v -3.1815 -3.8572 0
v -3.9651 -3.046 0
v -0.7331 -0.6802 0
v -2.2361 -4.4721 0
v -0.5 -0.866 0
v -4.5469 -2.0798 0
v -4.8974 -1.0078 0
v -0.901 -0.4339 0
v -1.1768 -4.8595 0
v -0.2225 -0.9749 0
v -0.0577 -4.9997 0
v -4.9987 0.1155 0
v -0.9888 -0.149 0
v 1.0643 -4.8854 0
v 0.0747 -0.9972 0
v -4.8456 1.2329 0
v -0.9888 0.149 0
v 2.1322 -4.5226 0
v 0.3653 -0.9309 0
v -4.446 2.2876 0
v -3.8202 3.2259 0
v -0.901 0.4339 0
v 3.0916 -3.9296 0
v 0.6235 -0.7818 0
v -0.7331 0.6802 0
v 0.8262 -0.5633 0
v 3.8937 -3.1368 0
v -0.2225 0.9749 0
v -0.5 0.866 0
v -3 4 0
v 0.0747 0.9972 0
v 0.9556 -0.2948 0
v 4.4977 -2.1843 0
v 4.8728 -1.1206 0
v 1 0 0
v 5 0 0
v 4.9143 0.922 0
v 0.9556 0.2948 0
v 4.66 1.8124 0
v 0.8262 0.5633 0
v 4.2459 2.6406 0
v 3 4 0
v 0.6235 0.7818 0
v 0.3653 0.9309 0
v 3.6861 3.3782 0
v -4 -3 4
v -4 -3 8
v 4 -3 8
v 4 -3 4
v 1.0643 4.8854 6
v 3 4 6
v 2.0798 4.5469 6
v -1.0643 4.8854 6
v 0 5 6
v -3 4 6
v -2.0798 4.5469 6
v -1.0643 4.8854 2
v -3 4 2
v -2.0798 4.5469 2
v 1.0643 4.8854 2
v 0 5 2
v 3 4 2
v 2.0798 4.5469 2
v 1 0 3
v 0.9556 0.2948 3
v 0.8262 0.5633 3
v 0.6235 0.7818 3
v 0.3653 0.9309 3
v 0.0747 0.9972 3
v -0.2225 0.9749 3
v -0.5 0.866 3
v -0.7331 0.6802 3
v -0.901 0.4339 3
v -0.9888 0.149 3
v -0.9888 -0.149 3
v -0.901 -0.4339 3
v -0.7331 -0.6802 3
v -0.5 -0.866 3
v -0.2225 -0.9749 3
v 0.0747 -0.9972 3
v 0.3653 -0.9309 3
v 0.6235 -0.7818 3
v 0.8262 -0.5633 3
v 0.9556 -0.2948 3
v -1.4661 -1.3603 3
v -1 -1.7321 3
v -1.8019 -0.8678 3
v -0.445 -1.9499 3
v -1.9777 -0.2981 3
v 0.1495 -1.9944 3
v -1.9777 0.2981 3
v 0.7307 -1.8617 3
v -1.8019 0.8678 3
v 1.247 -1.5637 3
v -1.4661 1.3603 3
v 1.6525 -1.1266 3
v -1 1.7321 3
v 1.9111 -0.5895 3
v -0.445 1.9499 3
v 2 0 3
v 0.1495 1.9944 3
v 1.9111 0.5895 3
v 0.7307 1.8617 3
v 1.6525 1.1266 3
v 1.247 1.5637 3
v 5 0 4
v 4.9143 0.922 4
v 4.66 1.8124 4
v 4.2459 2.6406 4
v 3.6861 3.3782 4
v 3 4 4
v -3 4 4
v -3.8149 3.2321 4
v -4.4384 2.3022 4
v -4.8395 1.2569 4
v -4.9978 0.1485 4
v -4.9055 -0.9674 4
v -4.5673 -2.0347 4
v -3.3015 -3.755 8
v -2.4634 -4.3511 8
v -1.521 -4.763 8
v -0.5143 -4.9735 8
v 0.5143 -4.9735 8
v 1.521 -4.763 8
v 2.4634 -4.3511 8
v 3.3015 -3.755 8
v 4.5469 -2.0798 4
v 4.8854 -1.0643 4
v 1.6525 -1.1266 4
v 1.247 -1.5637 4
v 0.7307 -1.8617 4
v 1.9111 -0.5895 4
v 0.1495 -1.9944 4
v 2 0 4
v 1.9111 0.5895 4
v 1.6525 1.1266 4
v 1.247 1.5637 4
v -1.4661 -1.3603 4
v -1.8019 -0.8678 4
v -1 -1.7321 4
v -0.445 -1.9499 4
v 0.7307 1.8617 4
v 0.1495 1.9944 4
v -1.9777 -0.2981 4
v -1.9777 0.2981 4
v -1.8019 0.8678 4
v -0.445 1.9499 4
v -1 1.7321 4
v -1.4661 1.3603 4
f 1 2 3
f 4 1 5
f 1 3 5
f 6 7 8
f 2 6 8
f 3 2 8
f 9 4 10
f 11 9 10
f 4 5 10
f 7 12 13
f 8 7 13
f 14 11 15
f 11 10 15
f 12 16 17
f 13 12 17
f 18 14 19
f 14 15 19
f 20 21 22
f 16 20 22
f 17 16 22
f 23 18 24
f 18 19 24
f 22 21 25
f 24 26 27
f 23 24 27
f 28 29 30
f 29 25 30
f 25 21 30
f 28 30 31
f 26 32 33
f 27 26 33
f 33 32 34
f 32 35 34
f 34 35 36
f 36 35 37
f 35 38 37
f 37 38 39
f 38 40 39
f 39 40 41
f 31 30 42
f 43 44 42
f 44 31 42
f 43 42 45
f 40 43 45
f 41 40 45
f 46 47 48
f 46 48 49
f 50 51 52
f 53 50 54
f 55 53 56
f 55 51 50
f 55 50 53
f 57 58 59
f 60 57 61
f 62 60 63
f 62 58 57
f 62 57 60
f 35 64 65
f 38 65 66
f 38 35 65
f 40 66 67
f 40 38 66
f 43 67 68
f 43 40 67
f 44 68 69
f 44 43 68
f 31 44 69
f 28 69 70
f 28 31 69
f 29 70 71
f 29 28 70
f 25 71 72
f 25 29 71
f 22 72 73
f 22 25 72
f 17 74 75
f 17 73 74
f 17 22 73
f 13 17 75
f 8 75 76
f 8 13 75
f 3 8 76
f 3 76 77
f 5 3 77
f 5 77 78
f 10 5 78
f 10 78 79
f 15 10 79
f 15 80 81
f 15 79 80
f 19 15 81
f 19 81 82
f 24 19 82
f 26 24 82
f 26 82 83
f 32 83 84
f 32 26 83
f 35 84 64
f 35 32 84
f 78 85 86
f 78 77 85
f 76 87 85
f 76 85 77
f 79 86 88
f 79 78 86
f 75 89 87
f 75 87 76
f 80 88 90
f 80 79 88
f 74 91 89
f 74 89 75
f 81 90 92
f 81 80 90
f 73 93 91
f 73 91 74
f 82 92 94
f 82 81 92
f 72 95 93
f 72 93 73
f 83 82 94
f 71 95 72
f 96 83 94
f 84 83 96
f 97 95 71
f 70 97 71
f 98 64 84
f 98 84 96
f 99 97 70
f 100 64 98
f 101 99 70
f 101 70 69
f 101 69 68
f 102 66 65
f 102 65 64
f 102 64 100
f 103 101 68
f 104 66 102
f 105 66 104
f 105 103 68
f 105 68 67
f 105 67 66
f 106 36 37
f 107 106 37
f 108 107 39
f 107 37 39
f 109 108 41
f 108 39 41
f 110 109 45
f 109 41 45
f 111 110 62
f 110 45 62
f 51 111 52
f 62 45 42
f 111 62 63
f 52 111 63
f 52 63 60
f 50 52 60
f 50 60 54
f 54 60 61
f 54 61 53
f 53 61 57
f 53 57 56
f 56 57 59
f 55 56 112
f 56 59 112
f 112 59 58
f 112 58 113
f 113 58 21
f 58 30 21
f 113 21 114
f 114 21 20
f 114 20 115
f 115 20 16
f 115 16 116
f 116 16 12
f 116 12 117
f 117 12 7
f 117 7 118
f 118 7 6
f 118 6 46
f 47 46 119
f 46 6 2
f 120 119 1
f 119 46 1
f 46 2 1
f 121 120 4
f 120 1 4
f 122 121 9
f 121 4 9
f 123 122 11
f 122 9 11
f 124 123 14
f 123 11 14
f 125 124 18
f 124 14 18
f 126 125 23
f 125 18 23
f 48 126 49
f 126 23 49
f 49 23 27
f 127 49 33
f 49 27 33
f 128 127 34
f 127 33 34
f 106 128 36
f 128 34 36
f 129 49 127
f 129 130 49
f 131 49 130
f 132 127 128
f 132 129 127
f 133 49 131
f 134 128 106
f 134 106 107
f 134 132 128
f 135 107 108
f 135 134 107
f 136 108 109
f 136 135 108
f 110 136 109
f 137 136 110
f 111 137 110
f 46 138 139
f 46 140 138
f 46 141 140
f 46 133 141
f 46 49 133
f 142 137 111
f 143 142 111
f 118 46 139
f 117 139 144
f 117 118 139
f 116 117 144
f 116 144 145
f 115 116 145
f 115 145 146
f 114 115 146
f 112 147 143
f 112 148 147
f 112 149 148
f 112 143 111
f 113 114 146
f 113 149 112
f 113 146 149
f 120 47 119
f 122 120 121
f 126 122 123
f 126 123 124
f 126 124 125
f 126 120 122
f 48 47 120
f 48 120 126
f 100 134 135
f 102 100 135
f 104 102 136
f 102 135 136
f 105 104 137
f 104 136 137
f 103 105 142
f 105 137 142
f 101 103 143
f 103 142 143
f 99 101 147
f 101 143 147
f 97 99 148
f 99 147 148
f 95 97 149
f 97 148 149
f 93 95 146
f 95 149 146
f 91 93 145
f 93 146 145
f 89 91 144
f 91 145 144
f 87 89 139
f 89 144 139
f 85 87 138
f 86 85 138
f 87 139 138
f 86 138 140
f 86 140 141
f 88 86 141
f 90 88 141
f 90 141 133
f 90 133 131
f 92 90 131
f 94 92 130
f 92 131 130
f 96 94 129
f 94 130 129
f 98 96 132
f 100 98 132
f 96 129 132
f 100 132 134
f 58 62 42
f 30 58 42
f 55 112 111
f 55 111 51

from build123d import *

# Parameters (mm, degrees)
SKETCH1_R           = 5
SKETCH1_R_2         = 1
BOSS_EXTRUDE1_DEPTH = 8
SKETCH2_W           = 2
SKETCH2_H           = 1
CUT_EXTRUDE1_DEPTH  = 9
SKETCH3_R           = 2
CUT_EXTRUDE2_DEPTH  = 1


with BuildPart() as part:
    # Sketch1 → Boss-Extrude1 (new body)
    with BuildSketch(Plane.XY):
        Circle(SKETCH1_R)
        Circle(SKETCH1_R_2, mode=Mode.SUBTRACT)
    extrude(amount=BOSS_EXTRUDE1_DEPTH)

    # Sketch2 → Cut-Extrude1 (cut, symmetric)
    with BuildSketch(Plane(origin=(0, 0, 0), x_dir=(0, 0, -1), z_dir=(1, 0, 0))):
        Polygon((-8, -3), (-4, -3), (-4, 4), (-6, 4), (-6, 5), (-8, 5), align=None)
        with Locations((-1, 4.5)):
            Rectangle(SKETCH2_W, SKETCH2_H)
    extrude(amount=CUT_EXTRUDE1_DEPTH, both=True, mode=Mode.SUBTRACT)

    # Sketch3 → Cut-Extrude2 (cut)
    with BuildSketch(Plane.XY.offset(4)):
        Circle(SKETCH3_R)
    extrude(amount=-CUT_EXTRUDE2_DEPTH, mode=Mode.SUBTRACT)


solid = part.part
